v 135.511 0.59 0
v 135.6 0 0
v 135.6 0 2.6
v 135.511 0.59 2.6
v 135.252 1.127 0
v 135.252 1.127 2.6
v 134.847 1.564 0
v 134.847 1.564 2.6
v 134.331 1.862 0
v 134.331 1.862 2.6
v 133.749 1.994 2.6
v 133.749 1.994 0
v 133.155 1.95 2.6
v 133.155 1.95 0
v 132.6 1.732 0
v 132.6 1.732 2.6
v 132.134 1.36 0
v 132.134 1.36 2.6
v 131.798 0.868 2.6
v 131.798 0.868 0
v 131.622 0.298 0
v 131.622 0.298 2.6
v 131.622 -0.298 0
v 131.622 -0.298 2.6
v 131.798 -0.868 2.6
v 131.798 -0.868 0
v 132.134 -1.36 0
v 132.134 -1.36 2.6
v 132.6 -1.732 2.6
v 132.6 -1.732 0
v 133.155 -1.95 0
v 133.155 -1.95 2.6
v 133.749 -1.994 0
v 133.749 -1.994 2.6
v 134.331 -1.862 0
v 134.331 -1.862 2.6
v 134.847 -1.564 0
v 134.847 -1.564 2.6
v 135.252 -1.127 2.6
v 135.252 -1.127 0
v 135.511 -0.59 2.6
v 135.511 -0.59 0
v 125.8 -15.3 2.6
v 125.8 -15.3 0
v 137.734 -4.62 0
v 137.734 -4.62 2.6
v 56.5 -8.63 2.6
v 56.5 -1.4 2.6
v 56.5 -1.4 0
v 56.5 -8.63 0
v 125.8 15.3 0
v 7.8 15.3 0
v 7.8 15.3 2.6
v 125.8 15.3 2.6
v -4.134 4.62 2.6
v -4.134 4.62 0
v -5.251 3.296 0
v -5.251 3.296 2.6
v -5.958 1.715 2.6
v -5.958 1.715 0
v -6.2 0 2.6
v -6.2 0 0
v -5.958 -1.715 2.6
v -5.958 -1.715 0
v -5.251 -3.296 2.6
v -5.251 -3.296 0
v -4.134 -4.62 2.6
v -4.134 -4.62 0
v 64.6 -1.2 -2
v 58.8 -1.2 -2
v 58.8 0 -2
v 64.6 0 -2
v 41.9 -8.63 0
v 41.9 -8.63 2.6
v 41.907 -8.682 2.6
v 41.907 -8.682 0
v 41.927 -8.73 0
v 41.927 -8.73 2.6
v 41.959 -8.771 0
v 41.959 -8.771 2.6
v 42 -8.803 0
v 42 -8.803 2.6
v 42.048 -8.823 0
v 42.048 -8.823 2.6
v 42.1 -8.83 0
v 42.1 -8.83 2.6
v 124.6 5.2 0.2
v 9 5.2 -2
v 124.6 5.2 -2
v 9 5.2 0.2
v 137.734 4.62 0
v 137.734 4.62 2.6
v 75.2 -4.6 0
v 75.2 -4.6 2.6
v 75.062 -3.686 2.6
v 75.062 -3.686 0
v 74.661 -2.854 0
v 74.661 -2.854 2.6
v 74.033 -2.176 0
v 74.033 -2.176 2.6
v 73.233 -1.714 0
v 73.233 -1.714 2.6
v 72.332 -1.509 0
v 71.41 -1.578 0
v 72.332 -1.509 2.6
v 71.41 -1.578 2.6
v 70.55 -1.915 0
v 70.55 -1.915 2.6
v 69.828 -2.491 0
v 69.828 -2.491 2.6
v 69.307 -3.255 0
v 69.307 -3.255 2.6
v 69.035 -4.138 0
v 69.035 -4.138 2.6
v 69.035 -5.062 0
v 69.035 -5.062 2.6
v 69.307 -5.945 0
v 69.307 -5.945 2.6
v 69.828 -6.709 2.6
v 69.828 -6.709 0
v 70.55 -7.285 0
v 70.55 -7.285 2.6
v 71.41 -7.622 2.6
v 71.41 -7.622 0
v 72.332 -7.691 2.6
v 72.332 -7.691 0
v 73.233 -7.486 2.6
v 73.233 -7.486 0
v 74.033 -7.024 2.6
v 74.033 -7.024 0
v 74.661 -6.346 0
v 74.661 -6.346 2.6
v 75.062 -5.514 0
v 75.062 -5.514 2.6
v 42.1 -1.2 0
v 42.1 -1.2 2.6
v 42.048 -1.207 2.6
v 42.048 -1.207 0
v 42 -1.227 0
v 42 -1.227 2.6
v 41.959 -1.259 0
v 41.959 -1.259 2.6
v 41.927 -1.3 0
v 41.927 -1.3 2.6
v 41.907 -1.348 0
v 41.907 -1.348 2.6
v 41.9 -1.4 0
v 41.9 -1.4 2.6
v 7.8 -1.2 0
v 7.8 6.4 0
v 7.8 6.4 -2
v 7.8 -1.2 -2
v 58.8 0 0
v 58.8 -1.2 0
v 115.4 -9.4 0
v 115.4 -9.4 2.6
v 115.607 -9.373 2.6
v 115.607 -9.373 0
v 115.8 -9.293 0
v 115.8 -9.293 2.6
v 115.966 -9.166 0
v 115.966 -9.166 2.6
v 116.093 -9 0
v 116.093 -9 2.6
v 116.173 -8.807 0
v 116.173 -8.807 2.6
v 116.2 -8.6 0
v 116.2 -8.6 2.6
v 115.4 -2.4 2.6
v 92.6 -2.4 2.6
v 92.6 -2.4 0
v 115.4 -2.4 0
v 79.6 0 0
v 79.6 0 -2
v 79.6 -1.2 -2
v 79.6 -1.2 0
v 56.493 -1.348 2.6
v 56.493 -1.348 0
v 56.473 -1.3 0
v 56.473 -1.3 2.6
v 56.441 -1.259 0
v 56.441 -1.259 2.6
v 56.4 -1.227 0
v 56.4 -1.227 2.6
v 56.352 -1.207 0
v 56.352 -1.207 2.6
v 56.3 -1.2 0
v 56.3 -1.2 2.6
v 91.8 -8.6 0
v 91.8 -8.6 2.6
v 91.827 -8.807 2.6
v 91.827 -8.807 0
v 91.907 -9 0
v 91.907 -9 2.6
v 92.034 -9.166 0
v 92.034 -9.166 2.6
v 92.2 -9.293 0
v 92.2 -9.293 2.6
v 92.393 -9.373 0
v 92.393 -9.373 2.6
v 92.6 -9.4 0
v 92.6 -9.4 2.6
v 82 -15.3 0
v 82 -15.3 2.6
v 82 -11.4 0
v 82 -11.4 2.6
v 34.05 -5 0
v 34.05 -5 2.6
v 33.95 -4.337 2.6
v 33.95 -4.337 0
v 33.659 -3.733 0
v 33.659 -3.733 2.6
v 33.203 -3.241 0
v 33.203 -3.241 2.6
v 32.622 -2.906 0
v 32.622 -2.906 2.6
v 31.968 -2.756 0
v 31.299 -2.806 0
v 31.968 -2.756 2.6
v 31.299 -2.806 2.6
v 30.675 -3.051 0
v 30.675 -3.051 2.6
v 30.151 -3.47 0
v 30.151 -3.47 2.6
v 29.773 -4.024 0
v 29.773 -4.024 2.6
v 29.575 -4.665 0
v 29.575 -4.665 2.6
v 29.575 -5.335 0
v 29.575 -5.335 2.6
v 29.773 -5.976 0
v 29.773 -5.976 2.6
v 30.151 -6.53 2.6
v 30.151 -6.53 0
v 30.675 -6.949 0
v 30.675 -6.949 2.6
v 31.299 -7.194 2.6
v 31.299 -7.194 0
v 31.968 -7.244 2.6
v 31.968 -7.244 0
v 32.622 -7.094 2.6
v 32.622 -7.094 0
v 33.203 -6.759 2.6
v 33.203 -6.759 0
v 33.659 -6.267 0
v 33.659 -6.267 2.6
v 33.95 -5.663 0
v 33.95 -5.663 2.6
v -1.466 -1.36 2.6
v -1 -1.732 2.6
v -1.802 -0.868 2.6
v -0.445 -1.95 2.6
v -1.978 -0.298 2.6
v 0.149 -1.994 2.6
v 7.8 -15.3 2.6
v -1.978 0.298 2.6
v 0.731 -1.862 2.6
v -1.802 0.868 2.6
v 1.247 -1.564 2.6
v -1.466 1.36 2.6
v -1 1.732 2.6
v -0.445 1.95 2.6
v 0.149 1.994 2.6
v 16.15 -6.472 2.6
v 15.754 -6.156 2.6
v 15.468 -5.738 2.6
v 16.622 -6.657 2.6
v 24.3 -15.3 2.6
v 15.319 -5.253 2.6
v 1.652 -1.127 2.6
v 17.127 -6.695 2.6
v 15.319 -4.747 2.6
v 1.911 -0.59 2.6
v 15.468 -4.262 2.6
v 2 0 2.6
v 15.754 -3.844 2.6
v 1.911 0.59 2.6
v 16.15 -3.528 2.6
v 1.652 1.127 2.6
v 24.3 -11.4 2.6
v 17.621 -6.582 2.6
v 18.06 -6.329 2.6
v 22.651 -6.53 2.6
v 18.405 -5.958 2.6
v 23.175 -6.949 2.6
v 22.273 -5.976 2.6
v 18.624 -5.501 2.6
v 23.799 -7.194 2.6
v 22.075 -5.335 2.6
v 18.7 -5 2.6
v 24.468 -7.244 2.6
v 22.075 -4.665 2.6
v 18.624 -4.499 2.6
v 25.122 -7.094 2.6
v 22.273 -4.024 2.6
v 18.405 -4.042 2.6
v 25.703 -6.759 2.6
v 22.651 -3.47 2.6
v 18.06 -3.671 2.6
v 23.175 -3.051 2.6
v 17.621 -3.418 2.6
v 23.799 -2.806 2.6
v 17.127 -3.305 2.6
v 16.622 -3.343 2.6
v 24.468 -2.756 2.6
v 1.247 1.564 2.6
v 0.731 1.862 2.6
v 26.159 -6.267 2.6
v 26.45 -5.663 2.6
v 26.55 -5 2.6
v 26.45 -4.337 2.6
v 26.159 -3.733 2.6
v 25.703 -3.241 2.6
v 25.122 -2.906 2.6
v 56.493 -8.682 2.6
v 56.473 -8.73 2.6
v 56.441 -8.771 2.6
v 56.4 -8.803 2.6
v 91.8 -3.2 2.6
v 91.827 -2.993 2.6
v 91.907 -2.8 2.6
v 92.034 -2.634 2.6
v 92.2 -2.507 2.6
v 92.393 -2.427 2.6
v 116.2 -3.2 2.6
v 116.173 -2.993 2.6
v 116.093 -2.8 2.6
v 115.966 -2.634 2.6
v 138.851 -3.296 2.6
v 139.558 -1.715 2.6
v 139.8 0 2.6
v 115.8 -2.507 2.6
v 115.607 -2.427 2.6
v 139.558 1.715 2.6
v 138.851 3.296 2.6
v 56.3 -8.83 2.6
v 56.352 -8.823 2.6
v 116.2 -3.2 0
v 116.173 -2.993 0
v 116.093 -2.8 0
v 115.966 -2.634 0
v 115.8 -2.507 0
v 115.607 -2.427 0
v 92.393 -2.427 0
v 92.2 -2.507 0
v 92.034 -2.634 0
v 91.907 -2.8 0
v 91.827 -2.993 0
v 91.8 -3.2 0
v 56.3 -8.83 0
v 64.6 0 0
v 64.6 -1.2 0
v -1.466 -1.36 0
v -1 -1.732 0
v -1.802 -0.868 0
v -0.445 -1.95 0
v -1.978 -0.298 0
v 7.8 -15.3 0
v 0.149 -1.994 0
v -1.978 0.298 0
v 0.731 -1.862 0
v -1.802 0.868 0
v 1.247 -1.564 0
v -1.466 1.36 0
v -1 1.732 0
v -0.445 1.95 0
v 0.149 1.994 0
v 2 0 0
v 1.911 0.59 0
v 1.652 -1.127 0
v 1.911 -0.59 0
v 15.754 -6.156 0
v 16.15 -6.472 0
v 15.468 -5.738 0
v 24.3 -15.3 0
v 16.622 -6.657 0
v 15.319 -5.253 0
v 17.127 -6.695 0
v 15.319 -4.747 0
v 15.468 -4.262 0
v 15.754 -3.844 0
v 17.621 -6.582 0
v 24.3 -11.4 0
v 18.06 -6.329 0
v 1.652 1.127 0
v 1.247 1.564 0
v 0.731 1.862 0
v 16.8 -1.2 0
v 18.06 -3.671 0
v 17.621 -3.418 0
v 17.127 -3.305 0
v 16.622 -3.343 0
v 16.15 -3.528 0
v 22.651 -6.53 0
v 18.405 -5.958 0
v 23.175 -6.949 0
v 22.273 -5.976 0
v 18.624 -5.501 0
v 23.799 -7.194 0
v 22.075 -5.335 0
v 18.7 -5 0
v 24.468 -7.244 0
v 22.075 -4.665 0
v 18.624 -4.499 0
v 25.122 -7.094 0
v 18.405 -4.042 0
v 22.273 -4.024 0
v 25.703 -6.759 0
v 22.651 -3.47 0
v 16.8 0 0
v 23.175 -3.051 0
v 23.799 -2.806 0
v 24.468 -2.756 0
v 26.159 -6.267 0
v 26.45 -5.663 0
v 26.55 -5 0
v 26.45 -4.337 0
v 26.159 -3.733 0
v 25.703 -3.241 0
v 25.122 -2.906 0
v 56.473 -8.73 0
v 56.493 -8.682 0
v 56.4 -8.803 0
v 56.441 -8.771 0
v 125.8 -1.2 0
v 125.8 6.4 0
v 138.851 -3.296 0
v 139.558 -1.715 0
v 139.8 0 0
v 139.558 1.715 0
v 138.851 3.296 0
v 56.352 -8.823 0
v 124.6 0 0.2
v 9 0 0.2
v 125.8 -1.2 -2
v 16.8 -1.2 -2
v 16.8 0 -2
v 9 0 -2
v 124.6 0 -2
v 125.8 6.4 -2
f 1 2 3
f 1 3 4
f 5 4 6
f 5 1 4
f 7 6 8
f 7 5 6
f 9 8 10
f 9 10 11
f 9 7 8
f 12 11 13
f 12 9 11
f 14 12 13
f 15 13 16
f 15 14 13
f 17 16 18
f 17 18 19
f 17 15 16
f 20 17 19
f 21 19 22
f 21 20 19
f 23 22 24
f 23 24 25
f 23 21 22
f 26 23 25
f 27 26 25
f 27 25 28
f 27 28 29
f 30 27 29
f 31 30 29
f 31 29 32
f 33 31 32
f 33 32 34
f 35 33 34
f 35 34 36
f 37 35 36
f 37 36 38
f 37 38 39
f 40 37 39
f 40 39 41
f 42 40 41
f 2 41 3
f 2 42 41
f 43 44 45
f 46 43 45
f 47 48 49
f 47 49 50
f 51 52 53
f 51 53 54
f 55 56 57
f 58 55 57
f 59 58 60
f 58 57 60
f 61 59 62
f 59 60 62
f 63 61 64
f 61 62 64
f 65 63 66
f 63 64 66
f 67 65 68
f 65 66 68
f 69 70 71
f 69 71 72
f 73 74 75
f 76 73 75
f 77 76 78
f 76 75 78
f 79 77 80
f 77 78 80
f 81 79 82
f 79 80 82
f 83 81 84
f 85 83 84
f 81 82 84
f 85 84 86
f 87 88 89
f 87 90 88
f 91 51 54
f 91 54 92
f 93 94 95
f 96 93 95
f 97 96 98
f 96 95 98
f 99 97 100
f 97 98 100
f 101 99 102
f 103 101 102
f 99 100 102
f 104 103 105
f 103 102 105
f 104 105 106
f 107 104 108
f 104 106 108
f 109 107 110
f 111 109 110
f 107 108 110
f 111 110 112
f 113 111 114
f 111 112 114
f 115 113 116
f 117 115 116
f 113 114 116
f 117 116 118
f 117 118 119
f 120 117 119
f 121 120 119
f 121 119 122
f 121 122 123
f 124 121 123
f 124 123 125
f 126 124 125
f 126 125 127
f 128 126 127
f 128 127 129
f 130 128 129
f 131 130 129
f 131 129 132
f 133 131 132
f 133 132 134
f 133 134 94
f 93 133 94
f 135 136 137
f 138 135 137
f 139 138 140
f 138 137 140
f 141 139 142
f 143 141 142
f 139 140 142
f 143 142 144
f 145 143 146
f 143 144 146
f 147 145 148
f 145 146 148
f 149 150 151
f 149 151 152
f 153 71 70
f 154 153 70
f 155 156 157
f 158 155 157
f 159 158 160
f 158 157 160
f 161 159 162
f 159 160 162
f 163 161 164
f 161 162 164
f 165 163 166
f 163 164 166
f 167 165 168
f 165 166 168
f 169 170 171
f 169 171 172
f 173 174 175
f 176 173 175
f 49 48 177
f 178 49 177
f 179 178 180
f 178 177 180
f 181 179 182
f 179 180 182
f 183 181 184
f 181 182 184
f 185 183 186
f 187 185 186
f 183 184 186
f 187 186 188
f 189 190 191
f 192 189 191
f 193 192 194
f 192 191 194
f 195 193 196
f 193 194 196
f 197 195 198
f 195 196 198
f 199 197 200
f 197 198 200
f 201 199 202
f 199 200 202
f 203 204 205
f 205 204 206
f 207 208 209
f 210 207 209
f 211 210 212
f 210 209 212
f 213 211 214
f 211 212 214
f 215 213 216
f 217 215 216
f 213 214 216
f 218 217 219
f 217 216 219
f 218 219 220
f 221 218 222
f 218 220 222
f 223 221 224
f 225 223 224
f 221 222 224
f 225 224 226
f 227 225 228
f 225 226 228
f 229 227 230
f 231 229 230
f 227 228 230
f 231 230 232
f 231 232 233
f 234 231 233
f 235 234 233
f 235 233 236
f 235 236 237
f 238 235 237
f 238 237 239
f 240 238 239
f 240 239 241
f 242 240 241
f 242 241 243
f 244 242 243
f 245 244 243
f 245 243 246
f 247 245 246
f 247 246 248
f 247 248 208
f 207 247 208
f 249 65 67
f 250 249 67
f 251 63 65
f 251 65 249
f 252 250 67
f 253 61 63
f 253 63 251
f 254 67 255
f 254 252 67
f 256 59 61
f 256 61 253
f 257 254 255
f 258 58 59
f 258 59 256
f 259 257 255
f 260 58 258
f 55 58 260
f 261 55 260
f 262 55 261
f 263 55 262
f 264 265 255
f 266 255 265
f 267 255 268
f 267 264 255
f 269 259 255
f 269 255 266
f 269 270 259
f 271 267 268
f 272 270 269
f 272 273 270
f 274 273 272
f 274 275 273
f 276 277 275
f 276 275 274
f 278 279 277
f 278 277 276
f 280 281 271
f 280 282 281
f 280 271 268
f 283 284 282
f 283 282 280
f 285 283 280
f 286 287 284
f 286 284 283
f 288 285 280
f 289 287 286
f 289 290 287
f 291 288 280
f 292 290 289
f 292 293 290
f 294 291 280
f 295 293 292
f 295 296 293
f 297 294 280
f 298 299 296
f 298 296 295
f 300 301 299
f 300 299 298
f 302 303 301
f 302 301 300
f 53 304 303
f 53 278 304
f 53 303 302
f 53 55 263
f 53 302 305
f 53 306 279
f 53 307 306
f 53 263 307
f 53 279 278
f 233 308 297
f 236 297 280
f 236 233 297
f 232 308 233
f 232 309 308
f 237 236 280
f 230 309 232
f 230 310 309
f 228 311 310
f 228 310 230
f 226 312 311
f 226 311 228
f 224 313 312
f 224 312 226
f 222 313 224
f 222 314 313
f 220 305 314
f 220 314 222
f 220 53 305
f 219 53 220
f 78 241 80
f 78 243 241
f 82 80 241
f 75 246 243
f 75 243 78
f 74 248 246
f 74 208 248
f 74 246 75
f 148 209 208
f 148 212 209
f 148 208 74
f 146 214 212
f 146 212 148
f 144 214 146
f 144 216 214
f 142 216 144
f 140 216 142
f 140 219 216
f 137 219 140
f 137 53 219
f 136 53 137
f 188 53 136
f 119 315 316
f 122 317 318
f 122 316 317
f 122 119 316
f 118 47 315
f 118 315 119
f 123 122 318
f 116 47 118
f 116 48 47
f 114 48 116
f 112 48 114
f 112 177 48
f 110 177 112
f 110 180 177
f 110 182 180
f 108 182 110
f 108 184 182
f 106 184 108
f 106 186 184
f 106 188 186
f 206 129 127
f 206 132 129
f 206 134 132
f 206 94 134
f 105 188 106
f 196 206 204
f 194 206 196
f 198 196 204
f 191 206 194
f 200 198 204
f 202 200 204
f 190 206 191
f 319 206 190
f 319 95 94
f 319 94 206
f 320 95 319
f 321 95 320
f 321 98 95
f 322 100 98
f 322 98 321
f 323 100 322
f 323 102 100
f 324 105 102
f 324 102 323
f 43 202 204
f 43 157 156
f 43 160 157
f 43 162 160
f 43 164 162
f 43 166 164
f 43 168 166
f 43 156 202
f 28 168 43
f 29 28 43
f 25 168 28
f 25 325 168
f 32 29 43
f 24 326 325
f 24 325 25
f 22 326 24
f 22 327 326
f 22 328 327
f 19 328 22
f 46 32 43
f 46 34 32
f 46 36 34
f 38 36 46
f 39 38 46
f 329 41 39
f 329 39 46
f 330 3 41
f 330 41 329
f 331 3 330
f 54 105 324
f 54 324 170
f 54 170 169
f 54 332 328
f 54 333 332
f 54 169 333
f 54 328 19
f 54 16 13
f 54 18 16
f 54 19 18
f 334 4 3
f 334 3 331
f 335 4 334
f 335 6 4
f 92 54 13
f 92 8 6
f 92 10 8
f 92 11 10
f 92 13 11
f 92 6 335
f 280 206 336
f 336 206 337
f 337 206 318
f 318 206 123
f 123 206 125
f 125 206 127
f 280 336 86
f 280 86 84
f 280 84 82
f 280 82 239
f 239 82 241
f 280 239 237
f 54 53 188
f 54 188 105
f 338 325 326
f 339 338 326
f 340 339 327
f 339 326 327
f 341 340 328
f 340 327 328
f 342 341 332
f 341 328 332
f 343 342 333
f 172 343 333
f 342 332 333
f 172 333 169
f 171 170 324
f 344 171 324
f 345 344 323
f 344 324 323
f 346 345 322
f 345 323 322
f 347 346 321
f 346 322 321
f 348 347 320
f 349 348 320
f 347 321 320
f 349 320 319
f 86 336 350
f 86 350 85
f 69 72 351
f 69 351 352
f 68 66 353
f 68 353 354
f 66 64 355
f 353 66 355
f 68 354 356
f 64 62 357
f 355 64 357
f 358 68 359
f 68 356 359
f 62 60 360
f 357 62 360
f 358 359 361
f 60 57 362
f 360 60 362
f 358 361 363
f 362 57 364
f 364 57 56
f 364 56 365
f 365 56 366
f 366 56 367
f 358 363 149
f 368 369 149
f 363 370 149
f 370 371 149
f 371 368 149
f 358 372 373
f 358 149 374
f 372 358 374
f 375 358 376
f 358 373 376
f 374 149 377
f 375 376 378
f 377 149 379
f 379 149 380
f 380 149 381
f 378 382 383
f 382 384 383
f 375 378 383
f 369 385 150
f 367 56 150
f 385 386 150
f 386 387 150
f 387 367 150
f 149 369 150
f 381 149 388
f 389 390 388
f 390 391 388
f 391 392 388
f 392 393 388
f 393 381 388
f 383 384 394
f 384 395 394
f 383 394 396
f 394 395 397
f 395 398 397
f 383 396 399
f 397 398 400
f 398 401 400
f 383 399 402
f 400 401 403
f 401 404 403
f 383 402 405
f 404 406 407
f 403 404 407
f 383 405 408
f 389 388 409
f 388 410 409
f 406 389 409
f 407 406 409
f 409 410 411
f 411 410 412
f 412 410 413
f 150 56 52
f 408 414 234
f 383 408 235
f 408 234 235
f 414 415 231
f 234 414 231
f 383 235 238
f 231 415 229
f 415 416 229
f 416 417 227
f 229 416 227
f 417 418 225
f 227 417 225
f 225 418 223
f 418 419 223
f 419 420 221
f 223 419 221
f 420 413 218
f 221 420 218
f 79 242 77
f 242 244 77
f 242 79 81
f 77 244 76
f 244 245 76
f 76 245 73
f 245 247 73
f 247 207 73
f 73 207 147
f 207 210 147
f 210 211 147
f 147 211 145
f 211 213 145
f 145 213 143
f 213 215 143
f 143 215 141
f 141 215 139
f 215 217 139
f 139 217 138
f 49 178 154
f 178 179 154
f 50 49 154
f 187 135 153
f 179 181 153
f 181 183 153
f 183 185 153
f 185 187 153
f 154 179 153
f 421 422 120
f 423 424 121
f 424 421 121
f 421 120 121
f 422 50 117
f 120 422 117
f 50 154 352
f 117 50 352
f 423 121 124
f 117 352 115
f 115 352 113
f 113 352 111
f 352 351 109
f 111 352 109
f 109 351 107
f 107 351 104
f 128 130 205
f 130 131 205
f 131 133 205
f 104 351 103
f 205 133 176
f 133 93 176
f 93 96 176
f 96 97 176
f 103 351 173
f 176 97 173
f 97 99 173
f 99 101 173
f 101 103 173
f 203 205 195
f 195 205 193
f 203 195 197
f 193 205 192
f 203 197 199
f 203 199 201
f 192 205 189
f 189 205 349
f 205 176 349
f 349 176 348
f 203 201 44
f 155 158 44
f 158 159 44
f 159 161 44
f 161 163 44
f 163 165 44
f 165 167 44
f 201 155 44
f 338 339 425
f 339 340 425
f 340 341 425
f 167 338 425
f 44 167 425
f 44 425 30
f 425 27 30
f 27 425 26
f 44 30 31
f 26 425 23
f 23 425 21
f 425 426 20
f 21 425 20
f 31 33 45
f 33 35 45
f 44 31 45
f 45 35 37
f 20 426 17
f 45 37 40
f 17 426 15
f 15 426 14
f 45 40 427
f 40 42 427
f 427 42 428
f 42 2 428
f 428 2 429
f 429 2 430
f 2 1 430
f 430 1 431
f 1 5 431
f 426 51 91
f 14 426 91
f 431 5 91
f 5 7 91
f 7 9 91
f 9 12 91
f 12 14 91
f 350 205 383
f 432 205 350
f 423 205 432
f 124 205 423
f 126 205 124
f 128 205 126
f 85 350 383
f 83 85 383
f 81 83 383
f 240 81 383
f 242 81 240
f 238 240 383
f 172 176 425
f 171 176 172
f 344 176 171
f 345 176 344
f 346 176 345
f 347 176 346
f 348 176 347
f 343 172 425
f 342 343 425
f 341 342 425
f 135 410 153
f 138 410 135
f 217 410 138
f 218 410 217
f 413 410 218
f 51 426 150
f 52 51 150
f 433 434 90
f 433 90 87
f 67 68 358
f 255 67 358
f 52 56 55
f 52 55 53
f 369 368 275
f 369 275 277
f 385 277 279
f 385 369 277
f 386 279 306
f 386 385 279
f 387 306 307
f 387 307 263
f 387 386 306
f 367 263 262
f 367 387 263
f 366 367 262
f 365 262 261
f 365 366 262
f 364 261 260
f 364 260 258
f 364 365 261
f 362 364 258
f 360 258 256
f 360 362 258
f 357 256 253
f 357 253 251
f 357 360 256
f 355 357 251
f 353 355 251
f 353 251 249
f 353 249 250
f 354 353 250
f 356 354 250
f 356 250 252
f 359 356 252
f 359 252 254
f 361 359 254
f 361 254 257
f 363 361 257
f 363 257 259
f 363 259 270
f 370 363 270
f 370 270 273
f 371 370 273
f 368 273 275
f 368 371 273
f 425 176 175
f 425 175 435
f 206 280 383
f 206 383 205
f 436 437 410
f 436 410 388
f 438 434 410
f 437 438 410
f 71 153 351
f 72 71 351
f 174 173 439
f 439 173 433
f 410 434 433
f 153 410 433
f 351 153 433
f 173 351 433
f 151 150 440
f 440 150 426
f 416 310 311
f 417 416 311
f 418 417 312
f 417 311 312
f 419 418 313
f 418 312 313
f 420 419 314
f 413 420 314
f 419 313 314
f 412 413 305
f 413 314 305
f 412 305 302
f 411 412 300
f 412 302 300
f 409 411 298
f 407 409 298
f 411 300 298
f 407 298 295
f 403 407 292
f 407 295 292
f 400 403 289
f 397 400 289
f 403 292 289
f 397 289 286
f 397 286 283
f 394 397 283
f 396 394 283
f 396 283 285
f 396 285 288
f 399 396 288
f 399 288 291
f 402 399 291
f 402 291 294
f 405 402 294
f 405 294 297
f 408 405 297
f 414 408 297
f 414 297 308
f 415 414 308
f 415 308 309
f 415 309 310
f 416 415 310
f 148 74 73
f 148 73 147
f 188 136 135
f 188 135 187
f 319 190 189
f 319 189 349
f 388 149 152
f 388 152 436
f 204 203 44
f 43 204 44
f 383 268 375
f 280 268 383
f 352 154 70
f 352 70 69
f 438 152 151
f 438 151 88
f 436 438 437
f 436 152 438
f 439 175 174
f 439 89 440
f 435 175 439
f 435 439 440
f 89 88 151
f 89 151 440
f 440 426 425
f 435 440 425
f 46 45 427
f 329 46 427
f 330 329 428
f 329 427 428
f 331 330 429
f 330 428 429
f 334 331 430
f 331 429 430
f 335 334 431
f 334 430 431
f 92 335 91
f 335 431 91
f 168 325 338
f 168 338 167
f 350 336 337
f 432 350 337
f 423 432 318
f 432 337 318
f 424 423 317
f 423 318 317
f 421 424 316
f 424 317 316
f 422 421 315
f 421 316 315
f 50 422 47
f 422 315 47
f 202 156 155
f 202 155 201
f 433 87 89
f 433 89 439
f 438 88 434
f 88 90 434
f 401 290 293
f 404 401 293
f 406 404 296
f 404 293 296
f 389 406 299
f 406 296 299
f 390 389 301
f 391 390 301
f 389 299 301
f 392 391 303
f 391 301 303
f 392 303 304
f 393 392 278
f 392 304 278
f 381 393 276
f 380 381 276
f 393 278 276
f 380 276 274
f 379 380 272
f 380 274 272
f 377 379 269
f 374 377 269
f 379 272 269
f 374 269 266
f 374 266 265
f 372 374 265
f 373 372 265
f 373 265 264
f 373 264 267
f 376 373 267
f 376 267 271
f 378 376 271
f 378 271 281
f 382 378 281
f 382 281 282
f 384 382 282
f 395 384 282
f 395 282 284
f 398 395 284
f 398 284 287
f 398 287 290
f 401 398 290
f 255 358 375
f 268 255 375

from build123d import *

# Parameters (mm, degrees)
SKETCH_R        = 2
PAD_DEPTH       = 2.6
SKETCH001_W     = 57.7
SKETCH001_H     = 3.9
POCKET_DEPTH    = 5
SKETCH002_W     = 115.6
SKETCH002_H     = 5.2
POCKET001_DEPTH = 0.2
SKETCH003_W     = 118
SKETCH003_H     = 7.6
SKETCH003_W_2   = 115.6
SKETCH003_H_2   = 5.2
PAD001_DEPTH    = 2
SKETCH004_R     = 2.25
SKETCH004_R_2   = 1.7
SKETCH004_R_3   = 3.1
POCKET002_DEPTH = 5
SKETCH005_W     = 42
SKETCH005_H     = 1.2
POCKET003_DEPTH = 2
SKETCH006_W     = 15
SKETCH006_H     = 15
POCKET004_DEPTH = 2


with BuildPart() as part:
    # Sketch → Pad (new body)
    with BuildSketch(Plane.XY):
        with BuildLine():
            ThreePointArc((-4.134472, 4.620188), (-6.2, 0), (-4.134472, -4.620188))
            Line((-4.134472, -4.620188), (7.8, -15.3))
            Line((7.8, -15.3), (125.8, -15.3))
            Line((125.8, -15.3), (137.734472, -4.620188))
            ThreePointArc((137.734472, -4.620188), (139.8, 0), (137.734472, 4.620188))
            Line((125.8, 15.3), (137.734472, 4.620188))
            Line((7.8, 15.3), (125.8, 15.3))
            Line((-4.134472, 4.620188), (7.8, 15.3))
        make_face()
        Circle(SKETCH_R, mode=Mode.SUBTRACT)
        with Locations((133.6, 0)):
            Circle(SKETCH_R, mode=Mode.SUBTRACT)
    extrude(amount=PAD_DEPTH)

    # Sketch001 (on Face12 of Pad) → Pocket (cut)
    with BuildSketch(Plane.XY.offset(2.6)):
        with Locations((53.15, -13.35)):
            Rectangle(SKETCH001_W, SKETCH001_H)
    extrude(amount=-POCKET_DEPTH, mode=Mode.SUBTRACT)

    # Sketch002 (on Face4 of Pocket) → Pocket001 (cut)
    with BuildSketch(Plane(origin=(0, 0, 0), x_dir=(1, 0, 0), z_dir=(0, 0, -1))):
        with Locations((66.8, -2.6)):
            Rectangle(SKETCH002_W, SKETCH002_H)
    extrude(amount=-POCKET001_DEPTH, mode=Mode.SUBTRACT)

    # Sketch003 (on Face4 of Pocket001) → Pad001 (join)
    with BuildSketch(Plane(origin=(0, 0, 0), x_dir=(1, 0, 0), z_dir=(0, 0, -1))):
        with Locations((66.8, -2.6)):
            Rectangle(SKETCH003_W, SKETCH003_H)
        with Locations((66.8, -2.6)):
            Rectangle(SKETCH003_W_2, SKETCH003_H_2, mode=Mode.SUBTRACT)
    extrude(amount=PAD001_DEPTH)

    # Sketch004 (on Face5 of Pad001) → Pocket002 (cut)
    with BuildSketch(Plane.XY.offset(2.6)):
        with Locations((24.3, -5)):
            Circle(SKETCH004_R)
        with Locations((31.8, -5)):
            Circle(SKETCH004_R)
        with Locations((17, -5)):
            Circle(SKETCH004_R_2)
        with Locations((72.1, -4.6)):
            Circle(SKETCH004_R_3)
        with BuildLine():
            Line((42.1, -1.2), (56.3, -1.2))
            ThreePointArc((56.5, -1.4), (56.441421, -1.258579), (56.3, -1.2))
            Line((56.5, -1.4), (56.5, -8.63))
            ThreePointArc((56.3, -8.83), (56.441421, -8.771421), (56.5, -8.63))
            Line((56.3, -8.83), (42.1, -8.83))
            ThreePointArc((41.9, -8.63), (41.958579, -8.771421), (42.1, -8.83))
            Line((41.9, -8.63), (41.9, -1.4))
            ThreePointArc((42.1, -1.2), (41.958579, -1.258579), (41.9, -1.4))
        make_face()
        with BuildLine():
            Line((92.6, -2.4), (115.4, -2.4))
            ThreePointArc((116.2, -3.2), (115.965685, -2.634315), (115.4, -2.4))
            Line((116.2, -3.2), (116.2, -8.6))
            ThreePointArc((115.4, -9.4), (115.965685, -9.165685), (116.2, -8.6))
            Line((115.4, -9.4), (92.6, -9.4))
            ThreePointArc((91.8, -8.6), (92.034315, -9.165685), (92.6, -9.4))
            Line((91.8, -8.6), (91.8, -3.2))
            ThreePointArc((92.6, -2.4), (92.034315, -2.634315), (91.8, -3.2))
        make_face()
    extrude(amount=-POCKET002_DEPTH, mode=Mode.SUBTRACT)

    # Sketch005 (on Face43 of Pocket002) → Pocket003 (cut)
    with BuildSketch(Plane(origin=(0, 0, -2), x_dir=(1, 0, 0), z_dir=(0, 0, -1))):
        with Locations((37.8, 0.6)):
            Rectangle(SKETCH005_W, SKETCH005_H)
    extrude(amount=-POCKET003_DEPTH, mode=Mode.SUBTRACT)

    # Sketch006 (on Face44 of Pocket003) → Pocket004 (cut)
    with BuildSketch(Plane(origin=(0, 0, -2), x_dir=(1, 0, 0), z_dir=(0, 0, -1))):
        with Locations((72.1, 4.6)):
            Rectangle(SKETCH006_W, SKETCH006_H)
    extrude(amount=-POCKET004_DEPTH, mode=Mode.SUBTRACT)


solid = part.part
